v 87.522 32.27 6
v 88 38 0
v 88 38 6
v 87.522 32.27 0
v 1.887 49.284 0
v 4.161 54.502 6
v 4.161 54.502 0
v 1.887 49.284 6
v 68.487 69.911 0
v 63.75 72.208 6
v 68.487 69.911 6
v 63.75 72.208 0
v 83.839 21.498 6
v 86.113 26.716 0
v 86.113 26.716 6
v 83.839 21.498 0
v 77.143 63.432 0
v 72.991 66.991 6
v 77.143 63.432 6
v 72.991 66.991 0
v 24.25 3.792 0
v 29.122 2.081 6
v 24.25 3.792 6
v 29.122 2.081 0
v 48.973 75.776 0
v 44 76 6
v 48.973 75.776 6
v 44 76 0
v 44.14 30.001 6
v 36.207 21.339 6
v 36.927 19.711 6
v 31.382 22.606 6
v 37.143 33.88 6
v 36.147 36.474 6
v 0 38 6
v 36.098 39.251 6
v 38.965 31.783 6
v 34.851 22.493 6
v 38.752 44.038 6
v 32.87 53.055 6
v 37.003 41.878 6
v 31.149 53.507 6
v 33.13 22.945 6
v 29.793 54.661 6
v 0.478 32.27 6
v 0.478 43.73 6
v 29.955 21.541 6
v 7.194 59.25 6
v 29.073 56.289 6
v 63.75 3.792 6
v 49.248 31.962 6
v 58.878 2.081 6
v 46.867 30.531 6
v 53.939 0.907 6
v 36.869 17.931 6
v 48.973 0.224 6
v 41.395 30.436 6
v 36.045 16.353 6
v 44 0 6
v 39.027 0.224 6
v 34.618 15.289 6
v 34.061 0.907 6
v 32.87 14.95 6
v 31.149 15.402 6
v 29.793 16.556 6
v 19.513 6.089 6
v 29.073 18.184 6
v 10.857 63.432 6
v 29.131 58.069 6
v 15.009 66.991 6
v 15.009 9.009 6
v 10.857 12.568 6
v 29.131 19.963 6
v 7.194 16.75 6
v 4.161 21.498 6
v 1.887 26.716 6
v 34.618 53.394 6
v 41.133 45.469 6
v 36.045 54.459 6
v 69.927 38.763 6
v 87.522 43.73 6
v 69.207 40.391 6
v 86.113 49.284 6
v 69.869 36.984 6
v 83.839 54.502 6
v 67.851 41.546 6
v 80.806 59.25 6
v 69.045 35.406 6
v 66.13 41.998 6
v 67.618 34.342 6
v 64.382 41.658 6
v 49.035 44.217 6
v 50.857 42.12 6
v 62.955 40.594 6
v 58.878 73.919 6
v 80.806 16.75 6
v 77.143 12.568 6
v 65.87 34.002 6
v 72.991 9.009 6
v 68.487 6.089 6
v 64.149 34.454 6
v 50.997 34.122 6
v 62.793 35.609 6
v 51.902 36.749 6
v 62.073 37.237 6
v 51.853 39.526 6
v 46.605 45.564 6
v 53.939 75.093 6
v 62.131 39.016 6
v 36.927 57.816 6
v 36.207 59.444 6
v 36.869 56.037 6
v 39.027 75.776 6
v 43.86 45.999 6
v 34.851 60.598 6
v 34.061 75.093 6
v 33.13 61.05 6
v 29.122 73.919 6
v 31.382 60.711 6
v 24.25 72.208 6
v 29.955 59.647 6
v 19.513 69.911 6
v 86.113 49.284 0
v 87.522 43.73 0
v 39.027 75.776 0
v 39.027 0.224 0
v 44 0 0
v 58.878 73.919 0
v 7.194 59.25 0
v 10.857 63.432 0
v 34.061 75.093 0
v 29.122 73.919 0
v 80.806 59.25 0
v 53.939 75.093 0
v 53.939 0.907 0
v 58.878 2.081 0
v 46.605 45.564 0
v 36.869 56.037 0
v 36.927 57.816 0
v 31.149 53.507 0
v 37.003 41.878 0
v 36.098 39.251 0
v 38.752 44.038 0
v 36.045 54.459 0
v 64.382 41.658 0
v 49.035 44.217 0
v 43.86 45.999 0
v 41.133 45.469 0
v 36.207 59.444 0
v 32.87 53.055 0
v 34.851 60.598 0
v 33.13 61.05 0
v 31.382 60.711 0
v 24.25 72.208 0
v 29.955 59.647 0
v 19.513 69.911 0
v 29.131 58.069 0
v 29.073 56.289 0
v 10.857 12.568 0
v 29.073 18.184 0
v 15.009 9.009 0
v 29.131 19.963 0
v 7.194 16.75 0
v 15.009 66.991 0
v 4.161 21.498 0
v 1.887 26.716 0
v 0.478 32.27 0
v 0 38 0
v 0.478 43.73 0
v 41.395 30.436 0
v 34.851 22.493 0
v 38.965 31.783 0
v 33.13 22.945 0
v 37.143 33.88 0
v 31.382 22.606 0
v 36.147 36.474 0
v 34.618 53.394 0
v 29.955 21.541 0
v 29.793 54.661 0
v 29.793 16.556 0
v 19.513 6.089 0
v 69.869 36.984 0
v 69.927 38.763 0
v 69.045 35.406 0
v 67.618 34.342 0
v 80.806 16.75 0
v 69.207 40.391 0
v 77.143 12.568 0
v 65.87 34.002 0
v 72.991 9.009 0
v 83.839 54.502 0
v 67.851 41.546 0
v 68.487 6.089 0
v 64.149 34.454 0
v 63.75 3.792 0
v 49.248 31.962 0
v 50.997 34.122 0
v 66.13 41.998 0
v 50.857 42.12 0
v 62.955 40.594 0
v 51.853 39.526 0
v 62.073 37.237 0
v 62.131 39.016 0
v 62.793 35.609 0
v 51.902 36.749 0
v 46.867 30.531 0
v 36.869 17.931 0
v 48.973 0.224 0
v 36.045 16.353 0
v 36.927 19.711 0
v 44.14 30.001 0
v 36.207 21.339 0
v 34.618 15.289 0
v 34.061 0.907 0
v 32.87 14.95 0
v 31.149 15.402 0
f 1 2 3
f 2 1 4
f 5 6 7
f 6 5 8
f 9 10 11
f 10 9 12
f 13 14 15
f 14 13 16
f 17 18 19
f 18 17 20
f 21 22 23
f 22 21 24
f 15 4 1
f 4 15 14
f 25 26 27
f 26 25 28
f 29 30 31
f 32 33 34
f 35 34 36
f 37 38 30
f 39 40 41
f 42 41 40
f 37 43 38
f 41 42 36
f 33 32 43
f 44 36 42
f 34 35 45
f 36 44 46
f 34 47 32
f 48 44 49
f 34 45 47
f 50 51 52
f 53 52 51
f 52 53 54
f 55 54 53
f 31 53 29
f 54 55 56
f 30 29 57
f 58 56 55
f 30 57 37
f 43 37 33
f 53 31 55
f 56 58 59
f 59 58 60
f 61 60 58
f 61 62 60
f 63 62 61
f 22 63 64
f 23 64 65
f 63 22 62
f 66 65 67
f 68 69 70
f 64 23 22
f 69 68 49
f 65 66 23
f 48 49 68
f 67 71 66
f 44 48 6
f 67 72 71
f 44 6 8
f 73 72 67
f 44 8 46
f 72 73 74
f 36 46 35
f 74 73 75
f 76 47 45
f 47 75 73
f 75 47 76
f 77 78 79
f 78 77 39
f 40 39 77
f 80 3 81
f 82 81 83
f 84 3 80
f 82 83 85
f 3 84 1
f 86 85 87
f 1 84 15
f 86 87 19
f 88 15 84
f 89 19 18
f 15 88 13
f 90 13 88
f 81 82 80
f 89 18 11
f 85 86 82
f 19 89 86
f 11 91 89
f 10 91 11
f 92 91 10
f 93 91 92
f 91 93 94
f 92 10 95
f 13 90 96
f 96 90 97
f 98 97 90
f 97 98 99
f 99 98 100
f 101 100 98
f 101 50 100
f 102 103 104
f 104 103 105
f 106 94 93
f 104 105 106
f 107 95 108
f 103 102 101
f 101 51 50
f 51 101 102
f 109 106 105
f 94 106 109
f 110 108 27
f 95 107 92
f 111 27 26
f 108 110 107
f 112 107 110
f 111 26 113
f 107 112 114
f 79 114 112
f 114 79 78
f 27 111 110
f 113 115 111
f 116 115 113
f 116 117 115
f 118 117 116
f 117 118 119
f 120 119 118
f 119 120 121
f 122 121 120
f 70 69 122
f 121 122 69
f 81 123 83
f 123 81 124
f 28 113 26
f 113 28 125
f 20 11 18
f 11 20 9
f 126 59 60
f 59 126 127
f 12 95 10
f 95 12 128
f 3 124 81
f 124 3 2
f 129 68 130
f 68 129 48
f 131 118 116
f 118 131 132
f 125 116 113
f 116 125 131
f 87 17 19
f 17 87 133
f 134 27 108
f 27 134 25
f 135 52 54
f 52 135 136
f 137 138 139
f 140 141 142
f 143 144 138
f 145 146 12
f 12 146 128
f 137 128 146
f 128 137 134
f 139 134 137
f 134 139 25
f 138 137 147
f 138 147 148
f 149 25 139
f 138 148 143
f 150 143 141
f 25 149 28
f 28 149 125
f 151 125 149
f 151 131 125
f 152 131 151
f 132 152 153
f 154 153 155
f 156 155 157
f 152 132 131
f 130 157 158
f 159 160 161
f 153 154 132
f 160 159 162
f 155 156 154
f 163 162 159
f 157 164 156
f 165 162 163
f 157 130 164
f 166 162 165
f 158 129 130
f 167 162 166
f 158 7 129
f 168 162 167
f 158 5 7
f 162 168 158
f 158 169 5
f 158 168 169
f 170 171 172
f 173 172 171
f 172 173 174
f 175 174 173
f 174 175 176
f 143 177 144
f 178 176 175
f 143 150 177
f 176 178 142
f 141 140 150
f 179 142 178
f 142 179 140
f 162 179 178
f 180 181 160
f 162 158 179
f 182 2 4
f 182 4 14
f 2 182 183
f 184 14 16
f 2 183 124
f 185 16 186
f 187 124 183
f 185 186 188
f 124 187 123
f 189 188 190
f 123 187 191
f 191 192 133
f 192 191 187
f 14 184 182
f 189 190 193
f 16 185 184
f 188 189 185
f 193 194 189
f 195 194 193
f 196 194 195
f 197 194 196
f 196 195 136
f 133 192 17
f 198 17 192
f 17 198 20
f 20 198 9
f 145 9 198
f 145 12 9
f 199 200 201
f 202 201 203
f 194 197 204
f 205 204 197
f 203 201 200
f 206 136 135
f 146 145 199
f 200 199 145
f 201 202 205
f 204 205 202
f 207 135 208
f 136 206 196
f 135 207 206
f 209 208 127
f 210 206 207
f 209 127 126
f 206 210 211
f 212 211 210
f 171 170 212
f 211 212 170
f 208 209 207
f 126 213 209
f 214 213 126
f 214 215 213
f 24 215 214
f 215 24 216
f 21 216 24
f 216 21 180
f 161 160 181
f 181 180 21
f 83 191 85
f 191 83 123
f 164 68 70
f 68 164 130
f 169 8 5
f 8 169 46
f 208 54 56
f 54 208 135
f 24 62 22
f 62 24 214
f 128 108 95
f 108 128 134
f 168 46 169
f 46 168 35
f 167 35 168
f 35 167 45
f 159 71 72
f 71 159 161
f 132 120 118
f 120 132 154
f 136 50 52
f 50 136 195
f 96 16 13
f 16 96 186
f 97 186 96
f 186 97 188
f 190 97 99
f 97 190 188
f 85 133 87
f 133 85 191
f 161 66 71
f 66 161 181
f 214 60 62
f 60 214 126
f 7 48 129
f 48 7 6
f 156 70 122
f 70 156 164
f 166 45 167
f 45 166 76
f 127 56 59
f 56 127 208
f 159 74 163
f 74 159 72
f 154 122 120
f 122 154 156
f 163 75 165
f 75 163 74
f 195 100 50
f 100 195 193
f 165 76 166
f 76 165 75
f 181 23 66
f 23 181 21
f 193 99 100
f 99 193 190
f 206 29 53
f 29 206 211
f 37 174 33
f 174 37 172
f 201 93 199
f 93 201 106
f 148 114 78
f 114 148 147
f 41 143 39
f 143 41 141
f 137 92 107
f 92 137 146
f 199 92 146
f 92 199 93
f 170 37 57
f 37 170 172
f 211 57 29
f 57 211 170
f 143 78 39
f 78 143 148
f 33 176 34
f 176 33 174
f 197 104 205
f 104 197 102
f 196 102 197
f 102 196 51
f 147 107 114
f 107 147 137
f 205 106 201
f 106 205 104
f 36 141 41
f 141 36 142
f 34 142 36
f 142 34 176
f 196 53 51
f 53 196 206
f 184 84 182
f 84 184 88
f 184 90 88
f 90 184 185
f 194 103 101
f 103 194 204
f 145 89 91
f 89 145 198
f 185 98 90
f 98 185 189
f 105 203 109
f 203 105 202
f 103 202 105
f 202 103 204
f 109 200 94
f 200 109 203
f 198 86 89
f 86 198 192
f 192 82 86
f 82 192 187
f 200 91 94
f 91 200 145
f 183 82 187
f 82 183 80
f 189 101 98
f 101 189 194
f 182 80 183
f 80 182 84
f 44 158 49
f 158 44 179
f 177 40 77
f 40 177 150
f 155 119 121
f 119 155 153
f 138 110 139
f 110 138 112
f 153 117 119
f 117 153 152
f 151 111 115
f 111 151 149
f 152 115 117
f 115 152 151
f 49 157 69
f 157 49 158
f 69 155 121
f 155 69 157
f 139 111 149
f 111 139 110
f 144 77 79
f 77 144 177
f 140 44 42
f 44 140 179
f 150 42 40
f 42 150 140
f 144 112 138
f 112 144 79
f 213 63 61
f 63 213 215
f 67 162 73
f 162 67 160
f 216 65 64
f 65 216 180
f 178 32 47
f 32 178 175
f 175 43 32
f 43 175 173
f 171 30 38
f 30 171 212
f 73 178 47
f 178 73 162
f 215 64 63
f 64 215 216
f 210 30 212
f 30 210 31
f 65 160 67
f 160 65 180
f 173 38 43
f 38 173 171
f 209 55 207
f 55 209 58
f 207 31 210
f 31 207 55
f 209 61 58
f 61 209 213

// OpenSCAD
$fn = 32;

// ----------------------------------------------------------------------
// Cam plate: double_lobe cam, base R36
// ----------------------------------------------------------------------

// --- parameters (mm) ---
base_r = 36;              // base circle radius
lobe_h = 8;               // cam lobe rise
bore_r = 8;               // shaft bore radius
plate_t = 6;              // plate thickness, Z (extrusion height)
ring_r = 22;              // lightening ring radius
bolt_r = 4;               // lightening hole radius

profile = [[88, 38], [87.522, 43.73], [86.113, 49.284], [83.839, 54.502], [80.806, 59.25], [77.143, 63.432], [72.991, 66.991], [68.487, 69.911], [63.75, 72.208], [58.878, 73.919], [53.939, 75.093], [48.973, 75.776], [44, 76], [39.027, 75.776], [34.061, 75.093], [29.122, 73.919], [24.25, 72.208], [19.513, 69.911], [15.009, 66.991], [10.857, 63.432], [7.194, 59.25], [4.161, 54.502], [1.887, 49.284], [0.478, 43.73], [0, 38], [0.478, 32.27], [1.887, 26.716], [4.161, 21.498], [7.194, 16.75], [10.857, 12.568], [15.009, 9.009], [19.513, 6.089], [24.25, 3.792], [29.122, 2.081], [34.061, 0.907], [39.027, 0.224], [44, 0], [48.973, 0.224], [53.939, 0.907], [58.878, 2.081], [63.75, 3.792], [68.487, 6.089], [72.991, 9.009], [77.143, 12.568], [80.806, 16.75], [83.839, 21.498], [86.113, 26.716], [87.522, 32.27]];  // primary outline, 48 points, counter clockwise
void_1 = [[51.853, 39.526], [50.857, 42.12], [49.035, 44.217], [46.605, 45.564], [43.86, 45.999], [41.133, 45.469], [38.752, 44.038], [37.003, 41.878], [36.098, 39.251], [36.147, 36.474], [37.143, 33.88], [38.965, 31.783], [41.395, 30.436], [44.14, 30.001], [46.867, 30.531], [49.248, 31.962], [50.997, 34.122], [51.902, 36.749]];  // shaft bore, 18 points
void_2 = [[69.927, 38.763], [69.207, 40.391], [67.851, 41.546], [66.13, 41.998], [64.382, 41.658], [62.955, 40.594], [62.131, 39.016], [62.073, 37.237], [62.793, 35.609], [64.149, 34.454], [65.87, 34.002], [67.618, 34.342], [69.045, 35.406], [69.869, 36.984]];  // lightening hole 1, 14 points
void_3 = [[36.927, 57.816], [36.207, 59.444], [34.851, 60.598], [33.13, 61.05], [31.382, 60.711], [29.955, 59.647], [29.131, 58.069], [29.073, 56.289], [29.793, 54.661], [31.149, 53.507], [32.87, 53.055], [34.618, 53.394], [36.045, 54.459], [36.869, 56.037]];  // lightening hole 2, 14 points
void_4 = [[36.927, 19.711], [36.207, 21.339], [34.851, 22.493], [33.13, 22.945], [31.382, 22.606], [29.955, 21.541], [29.131, 19.963], [29.073, 18.184], [29.793, 16.556], [31.149, 15.402], [32.87, 14.95], [34.618, 15.289], [36.045, 16.353], [36.869, 17.931]];  // lightening hole 3, 14 points

// --- the one profile operation ---
difference() {
  linear_extrude(height = plate_t) polygon(points = profile);
  translate([0, 0, -1])
    linear_extrude(height = plate_t + 2) polygon(points = void_1);
  translate([0, 0, -1])
    linear_extrude(height = plate_t + 2) polygon(points = void_2);
  translate([0, 0, -1])
    linear_extrude(height = plate_t + 2) polygon(points = void_3);
  translate([0, 0, -1])
    linear_extrude(height = plate_t + 2) polygon(points = void_4);
}
